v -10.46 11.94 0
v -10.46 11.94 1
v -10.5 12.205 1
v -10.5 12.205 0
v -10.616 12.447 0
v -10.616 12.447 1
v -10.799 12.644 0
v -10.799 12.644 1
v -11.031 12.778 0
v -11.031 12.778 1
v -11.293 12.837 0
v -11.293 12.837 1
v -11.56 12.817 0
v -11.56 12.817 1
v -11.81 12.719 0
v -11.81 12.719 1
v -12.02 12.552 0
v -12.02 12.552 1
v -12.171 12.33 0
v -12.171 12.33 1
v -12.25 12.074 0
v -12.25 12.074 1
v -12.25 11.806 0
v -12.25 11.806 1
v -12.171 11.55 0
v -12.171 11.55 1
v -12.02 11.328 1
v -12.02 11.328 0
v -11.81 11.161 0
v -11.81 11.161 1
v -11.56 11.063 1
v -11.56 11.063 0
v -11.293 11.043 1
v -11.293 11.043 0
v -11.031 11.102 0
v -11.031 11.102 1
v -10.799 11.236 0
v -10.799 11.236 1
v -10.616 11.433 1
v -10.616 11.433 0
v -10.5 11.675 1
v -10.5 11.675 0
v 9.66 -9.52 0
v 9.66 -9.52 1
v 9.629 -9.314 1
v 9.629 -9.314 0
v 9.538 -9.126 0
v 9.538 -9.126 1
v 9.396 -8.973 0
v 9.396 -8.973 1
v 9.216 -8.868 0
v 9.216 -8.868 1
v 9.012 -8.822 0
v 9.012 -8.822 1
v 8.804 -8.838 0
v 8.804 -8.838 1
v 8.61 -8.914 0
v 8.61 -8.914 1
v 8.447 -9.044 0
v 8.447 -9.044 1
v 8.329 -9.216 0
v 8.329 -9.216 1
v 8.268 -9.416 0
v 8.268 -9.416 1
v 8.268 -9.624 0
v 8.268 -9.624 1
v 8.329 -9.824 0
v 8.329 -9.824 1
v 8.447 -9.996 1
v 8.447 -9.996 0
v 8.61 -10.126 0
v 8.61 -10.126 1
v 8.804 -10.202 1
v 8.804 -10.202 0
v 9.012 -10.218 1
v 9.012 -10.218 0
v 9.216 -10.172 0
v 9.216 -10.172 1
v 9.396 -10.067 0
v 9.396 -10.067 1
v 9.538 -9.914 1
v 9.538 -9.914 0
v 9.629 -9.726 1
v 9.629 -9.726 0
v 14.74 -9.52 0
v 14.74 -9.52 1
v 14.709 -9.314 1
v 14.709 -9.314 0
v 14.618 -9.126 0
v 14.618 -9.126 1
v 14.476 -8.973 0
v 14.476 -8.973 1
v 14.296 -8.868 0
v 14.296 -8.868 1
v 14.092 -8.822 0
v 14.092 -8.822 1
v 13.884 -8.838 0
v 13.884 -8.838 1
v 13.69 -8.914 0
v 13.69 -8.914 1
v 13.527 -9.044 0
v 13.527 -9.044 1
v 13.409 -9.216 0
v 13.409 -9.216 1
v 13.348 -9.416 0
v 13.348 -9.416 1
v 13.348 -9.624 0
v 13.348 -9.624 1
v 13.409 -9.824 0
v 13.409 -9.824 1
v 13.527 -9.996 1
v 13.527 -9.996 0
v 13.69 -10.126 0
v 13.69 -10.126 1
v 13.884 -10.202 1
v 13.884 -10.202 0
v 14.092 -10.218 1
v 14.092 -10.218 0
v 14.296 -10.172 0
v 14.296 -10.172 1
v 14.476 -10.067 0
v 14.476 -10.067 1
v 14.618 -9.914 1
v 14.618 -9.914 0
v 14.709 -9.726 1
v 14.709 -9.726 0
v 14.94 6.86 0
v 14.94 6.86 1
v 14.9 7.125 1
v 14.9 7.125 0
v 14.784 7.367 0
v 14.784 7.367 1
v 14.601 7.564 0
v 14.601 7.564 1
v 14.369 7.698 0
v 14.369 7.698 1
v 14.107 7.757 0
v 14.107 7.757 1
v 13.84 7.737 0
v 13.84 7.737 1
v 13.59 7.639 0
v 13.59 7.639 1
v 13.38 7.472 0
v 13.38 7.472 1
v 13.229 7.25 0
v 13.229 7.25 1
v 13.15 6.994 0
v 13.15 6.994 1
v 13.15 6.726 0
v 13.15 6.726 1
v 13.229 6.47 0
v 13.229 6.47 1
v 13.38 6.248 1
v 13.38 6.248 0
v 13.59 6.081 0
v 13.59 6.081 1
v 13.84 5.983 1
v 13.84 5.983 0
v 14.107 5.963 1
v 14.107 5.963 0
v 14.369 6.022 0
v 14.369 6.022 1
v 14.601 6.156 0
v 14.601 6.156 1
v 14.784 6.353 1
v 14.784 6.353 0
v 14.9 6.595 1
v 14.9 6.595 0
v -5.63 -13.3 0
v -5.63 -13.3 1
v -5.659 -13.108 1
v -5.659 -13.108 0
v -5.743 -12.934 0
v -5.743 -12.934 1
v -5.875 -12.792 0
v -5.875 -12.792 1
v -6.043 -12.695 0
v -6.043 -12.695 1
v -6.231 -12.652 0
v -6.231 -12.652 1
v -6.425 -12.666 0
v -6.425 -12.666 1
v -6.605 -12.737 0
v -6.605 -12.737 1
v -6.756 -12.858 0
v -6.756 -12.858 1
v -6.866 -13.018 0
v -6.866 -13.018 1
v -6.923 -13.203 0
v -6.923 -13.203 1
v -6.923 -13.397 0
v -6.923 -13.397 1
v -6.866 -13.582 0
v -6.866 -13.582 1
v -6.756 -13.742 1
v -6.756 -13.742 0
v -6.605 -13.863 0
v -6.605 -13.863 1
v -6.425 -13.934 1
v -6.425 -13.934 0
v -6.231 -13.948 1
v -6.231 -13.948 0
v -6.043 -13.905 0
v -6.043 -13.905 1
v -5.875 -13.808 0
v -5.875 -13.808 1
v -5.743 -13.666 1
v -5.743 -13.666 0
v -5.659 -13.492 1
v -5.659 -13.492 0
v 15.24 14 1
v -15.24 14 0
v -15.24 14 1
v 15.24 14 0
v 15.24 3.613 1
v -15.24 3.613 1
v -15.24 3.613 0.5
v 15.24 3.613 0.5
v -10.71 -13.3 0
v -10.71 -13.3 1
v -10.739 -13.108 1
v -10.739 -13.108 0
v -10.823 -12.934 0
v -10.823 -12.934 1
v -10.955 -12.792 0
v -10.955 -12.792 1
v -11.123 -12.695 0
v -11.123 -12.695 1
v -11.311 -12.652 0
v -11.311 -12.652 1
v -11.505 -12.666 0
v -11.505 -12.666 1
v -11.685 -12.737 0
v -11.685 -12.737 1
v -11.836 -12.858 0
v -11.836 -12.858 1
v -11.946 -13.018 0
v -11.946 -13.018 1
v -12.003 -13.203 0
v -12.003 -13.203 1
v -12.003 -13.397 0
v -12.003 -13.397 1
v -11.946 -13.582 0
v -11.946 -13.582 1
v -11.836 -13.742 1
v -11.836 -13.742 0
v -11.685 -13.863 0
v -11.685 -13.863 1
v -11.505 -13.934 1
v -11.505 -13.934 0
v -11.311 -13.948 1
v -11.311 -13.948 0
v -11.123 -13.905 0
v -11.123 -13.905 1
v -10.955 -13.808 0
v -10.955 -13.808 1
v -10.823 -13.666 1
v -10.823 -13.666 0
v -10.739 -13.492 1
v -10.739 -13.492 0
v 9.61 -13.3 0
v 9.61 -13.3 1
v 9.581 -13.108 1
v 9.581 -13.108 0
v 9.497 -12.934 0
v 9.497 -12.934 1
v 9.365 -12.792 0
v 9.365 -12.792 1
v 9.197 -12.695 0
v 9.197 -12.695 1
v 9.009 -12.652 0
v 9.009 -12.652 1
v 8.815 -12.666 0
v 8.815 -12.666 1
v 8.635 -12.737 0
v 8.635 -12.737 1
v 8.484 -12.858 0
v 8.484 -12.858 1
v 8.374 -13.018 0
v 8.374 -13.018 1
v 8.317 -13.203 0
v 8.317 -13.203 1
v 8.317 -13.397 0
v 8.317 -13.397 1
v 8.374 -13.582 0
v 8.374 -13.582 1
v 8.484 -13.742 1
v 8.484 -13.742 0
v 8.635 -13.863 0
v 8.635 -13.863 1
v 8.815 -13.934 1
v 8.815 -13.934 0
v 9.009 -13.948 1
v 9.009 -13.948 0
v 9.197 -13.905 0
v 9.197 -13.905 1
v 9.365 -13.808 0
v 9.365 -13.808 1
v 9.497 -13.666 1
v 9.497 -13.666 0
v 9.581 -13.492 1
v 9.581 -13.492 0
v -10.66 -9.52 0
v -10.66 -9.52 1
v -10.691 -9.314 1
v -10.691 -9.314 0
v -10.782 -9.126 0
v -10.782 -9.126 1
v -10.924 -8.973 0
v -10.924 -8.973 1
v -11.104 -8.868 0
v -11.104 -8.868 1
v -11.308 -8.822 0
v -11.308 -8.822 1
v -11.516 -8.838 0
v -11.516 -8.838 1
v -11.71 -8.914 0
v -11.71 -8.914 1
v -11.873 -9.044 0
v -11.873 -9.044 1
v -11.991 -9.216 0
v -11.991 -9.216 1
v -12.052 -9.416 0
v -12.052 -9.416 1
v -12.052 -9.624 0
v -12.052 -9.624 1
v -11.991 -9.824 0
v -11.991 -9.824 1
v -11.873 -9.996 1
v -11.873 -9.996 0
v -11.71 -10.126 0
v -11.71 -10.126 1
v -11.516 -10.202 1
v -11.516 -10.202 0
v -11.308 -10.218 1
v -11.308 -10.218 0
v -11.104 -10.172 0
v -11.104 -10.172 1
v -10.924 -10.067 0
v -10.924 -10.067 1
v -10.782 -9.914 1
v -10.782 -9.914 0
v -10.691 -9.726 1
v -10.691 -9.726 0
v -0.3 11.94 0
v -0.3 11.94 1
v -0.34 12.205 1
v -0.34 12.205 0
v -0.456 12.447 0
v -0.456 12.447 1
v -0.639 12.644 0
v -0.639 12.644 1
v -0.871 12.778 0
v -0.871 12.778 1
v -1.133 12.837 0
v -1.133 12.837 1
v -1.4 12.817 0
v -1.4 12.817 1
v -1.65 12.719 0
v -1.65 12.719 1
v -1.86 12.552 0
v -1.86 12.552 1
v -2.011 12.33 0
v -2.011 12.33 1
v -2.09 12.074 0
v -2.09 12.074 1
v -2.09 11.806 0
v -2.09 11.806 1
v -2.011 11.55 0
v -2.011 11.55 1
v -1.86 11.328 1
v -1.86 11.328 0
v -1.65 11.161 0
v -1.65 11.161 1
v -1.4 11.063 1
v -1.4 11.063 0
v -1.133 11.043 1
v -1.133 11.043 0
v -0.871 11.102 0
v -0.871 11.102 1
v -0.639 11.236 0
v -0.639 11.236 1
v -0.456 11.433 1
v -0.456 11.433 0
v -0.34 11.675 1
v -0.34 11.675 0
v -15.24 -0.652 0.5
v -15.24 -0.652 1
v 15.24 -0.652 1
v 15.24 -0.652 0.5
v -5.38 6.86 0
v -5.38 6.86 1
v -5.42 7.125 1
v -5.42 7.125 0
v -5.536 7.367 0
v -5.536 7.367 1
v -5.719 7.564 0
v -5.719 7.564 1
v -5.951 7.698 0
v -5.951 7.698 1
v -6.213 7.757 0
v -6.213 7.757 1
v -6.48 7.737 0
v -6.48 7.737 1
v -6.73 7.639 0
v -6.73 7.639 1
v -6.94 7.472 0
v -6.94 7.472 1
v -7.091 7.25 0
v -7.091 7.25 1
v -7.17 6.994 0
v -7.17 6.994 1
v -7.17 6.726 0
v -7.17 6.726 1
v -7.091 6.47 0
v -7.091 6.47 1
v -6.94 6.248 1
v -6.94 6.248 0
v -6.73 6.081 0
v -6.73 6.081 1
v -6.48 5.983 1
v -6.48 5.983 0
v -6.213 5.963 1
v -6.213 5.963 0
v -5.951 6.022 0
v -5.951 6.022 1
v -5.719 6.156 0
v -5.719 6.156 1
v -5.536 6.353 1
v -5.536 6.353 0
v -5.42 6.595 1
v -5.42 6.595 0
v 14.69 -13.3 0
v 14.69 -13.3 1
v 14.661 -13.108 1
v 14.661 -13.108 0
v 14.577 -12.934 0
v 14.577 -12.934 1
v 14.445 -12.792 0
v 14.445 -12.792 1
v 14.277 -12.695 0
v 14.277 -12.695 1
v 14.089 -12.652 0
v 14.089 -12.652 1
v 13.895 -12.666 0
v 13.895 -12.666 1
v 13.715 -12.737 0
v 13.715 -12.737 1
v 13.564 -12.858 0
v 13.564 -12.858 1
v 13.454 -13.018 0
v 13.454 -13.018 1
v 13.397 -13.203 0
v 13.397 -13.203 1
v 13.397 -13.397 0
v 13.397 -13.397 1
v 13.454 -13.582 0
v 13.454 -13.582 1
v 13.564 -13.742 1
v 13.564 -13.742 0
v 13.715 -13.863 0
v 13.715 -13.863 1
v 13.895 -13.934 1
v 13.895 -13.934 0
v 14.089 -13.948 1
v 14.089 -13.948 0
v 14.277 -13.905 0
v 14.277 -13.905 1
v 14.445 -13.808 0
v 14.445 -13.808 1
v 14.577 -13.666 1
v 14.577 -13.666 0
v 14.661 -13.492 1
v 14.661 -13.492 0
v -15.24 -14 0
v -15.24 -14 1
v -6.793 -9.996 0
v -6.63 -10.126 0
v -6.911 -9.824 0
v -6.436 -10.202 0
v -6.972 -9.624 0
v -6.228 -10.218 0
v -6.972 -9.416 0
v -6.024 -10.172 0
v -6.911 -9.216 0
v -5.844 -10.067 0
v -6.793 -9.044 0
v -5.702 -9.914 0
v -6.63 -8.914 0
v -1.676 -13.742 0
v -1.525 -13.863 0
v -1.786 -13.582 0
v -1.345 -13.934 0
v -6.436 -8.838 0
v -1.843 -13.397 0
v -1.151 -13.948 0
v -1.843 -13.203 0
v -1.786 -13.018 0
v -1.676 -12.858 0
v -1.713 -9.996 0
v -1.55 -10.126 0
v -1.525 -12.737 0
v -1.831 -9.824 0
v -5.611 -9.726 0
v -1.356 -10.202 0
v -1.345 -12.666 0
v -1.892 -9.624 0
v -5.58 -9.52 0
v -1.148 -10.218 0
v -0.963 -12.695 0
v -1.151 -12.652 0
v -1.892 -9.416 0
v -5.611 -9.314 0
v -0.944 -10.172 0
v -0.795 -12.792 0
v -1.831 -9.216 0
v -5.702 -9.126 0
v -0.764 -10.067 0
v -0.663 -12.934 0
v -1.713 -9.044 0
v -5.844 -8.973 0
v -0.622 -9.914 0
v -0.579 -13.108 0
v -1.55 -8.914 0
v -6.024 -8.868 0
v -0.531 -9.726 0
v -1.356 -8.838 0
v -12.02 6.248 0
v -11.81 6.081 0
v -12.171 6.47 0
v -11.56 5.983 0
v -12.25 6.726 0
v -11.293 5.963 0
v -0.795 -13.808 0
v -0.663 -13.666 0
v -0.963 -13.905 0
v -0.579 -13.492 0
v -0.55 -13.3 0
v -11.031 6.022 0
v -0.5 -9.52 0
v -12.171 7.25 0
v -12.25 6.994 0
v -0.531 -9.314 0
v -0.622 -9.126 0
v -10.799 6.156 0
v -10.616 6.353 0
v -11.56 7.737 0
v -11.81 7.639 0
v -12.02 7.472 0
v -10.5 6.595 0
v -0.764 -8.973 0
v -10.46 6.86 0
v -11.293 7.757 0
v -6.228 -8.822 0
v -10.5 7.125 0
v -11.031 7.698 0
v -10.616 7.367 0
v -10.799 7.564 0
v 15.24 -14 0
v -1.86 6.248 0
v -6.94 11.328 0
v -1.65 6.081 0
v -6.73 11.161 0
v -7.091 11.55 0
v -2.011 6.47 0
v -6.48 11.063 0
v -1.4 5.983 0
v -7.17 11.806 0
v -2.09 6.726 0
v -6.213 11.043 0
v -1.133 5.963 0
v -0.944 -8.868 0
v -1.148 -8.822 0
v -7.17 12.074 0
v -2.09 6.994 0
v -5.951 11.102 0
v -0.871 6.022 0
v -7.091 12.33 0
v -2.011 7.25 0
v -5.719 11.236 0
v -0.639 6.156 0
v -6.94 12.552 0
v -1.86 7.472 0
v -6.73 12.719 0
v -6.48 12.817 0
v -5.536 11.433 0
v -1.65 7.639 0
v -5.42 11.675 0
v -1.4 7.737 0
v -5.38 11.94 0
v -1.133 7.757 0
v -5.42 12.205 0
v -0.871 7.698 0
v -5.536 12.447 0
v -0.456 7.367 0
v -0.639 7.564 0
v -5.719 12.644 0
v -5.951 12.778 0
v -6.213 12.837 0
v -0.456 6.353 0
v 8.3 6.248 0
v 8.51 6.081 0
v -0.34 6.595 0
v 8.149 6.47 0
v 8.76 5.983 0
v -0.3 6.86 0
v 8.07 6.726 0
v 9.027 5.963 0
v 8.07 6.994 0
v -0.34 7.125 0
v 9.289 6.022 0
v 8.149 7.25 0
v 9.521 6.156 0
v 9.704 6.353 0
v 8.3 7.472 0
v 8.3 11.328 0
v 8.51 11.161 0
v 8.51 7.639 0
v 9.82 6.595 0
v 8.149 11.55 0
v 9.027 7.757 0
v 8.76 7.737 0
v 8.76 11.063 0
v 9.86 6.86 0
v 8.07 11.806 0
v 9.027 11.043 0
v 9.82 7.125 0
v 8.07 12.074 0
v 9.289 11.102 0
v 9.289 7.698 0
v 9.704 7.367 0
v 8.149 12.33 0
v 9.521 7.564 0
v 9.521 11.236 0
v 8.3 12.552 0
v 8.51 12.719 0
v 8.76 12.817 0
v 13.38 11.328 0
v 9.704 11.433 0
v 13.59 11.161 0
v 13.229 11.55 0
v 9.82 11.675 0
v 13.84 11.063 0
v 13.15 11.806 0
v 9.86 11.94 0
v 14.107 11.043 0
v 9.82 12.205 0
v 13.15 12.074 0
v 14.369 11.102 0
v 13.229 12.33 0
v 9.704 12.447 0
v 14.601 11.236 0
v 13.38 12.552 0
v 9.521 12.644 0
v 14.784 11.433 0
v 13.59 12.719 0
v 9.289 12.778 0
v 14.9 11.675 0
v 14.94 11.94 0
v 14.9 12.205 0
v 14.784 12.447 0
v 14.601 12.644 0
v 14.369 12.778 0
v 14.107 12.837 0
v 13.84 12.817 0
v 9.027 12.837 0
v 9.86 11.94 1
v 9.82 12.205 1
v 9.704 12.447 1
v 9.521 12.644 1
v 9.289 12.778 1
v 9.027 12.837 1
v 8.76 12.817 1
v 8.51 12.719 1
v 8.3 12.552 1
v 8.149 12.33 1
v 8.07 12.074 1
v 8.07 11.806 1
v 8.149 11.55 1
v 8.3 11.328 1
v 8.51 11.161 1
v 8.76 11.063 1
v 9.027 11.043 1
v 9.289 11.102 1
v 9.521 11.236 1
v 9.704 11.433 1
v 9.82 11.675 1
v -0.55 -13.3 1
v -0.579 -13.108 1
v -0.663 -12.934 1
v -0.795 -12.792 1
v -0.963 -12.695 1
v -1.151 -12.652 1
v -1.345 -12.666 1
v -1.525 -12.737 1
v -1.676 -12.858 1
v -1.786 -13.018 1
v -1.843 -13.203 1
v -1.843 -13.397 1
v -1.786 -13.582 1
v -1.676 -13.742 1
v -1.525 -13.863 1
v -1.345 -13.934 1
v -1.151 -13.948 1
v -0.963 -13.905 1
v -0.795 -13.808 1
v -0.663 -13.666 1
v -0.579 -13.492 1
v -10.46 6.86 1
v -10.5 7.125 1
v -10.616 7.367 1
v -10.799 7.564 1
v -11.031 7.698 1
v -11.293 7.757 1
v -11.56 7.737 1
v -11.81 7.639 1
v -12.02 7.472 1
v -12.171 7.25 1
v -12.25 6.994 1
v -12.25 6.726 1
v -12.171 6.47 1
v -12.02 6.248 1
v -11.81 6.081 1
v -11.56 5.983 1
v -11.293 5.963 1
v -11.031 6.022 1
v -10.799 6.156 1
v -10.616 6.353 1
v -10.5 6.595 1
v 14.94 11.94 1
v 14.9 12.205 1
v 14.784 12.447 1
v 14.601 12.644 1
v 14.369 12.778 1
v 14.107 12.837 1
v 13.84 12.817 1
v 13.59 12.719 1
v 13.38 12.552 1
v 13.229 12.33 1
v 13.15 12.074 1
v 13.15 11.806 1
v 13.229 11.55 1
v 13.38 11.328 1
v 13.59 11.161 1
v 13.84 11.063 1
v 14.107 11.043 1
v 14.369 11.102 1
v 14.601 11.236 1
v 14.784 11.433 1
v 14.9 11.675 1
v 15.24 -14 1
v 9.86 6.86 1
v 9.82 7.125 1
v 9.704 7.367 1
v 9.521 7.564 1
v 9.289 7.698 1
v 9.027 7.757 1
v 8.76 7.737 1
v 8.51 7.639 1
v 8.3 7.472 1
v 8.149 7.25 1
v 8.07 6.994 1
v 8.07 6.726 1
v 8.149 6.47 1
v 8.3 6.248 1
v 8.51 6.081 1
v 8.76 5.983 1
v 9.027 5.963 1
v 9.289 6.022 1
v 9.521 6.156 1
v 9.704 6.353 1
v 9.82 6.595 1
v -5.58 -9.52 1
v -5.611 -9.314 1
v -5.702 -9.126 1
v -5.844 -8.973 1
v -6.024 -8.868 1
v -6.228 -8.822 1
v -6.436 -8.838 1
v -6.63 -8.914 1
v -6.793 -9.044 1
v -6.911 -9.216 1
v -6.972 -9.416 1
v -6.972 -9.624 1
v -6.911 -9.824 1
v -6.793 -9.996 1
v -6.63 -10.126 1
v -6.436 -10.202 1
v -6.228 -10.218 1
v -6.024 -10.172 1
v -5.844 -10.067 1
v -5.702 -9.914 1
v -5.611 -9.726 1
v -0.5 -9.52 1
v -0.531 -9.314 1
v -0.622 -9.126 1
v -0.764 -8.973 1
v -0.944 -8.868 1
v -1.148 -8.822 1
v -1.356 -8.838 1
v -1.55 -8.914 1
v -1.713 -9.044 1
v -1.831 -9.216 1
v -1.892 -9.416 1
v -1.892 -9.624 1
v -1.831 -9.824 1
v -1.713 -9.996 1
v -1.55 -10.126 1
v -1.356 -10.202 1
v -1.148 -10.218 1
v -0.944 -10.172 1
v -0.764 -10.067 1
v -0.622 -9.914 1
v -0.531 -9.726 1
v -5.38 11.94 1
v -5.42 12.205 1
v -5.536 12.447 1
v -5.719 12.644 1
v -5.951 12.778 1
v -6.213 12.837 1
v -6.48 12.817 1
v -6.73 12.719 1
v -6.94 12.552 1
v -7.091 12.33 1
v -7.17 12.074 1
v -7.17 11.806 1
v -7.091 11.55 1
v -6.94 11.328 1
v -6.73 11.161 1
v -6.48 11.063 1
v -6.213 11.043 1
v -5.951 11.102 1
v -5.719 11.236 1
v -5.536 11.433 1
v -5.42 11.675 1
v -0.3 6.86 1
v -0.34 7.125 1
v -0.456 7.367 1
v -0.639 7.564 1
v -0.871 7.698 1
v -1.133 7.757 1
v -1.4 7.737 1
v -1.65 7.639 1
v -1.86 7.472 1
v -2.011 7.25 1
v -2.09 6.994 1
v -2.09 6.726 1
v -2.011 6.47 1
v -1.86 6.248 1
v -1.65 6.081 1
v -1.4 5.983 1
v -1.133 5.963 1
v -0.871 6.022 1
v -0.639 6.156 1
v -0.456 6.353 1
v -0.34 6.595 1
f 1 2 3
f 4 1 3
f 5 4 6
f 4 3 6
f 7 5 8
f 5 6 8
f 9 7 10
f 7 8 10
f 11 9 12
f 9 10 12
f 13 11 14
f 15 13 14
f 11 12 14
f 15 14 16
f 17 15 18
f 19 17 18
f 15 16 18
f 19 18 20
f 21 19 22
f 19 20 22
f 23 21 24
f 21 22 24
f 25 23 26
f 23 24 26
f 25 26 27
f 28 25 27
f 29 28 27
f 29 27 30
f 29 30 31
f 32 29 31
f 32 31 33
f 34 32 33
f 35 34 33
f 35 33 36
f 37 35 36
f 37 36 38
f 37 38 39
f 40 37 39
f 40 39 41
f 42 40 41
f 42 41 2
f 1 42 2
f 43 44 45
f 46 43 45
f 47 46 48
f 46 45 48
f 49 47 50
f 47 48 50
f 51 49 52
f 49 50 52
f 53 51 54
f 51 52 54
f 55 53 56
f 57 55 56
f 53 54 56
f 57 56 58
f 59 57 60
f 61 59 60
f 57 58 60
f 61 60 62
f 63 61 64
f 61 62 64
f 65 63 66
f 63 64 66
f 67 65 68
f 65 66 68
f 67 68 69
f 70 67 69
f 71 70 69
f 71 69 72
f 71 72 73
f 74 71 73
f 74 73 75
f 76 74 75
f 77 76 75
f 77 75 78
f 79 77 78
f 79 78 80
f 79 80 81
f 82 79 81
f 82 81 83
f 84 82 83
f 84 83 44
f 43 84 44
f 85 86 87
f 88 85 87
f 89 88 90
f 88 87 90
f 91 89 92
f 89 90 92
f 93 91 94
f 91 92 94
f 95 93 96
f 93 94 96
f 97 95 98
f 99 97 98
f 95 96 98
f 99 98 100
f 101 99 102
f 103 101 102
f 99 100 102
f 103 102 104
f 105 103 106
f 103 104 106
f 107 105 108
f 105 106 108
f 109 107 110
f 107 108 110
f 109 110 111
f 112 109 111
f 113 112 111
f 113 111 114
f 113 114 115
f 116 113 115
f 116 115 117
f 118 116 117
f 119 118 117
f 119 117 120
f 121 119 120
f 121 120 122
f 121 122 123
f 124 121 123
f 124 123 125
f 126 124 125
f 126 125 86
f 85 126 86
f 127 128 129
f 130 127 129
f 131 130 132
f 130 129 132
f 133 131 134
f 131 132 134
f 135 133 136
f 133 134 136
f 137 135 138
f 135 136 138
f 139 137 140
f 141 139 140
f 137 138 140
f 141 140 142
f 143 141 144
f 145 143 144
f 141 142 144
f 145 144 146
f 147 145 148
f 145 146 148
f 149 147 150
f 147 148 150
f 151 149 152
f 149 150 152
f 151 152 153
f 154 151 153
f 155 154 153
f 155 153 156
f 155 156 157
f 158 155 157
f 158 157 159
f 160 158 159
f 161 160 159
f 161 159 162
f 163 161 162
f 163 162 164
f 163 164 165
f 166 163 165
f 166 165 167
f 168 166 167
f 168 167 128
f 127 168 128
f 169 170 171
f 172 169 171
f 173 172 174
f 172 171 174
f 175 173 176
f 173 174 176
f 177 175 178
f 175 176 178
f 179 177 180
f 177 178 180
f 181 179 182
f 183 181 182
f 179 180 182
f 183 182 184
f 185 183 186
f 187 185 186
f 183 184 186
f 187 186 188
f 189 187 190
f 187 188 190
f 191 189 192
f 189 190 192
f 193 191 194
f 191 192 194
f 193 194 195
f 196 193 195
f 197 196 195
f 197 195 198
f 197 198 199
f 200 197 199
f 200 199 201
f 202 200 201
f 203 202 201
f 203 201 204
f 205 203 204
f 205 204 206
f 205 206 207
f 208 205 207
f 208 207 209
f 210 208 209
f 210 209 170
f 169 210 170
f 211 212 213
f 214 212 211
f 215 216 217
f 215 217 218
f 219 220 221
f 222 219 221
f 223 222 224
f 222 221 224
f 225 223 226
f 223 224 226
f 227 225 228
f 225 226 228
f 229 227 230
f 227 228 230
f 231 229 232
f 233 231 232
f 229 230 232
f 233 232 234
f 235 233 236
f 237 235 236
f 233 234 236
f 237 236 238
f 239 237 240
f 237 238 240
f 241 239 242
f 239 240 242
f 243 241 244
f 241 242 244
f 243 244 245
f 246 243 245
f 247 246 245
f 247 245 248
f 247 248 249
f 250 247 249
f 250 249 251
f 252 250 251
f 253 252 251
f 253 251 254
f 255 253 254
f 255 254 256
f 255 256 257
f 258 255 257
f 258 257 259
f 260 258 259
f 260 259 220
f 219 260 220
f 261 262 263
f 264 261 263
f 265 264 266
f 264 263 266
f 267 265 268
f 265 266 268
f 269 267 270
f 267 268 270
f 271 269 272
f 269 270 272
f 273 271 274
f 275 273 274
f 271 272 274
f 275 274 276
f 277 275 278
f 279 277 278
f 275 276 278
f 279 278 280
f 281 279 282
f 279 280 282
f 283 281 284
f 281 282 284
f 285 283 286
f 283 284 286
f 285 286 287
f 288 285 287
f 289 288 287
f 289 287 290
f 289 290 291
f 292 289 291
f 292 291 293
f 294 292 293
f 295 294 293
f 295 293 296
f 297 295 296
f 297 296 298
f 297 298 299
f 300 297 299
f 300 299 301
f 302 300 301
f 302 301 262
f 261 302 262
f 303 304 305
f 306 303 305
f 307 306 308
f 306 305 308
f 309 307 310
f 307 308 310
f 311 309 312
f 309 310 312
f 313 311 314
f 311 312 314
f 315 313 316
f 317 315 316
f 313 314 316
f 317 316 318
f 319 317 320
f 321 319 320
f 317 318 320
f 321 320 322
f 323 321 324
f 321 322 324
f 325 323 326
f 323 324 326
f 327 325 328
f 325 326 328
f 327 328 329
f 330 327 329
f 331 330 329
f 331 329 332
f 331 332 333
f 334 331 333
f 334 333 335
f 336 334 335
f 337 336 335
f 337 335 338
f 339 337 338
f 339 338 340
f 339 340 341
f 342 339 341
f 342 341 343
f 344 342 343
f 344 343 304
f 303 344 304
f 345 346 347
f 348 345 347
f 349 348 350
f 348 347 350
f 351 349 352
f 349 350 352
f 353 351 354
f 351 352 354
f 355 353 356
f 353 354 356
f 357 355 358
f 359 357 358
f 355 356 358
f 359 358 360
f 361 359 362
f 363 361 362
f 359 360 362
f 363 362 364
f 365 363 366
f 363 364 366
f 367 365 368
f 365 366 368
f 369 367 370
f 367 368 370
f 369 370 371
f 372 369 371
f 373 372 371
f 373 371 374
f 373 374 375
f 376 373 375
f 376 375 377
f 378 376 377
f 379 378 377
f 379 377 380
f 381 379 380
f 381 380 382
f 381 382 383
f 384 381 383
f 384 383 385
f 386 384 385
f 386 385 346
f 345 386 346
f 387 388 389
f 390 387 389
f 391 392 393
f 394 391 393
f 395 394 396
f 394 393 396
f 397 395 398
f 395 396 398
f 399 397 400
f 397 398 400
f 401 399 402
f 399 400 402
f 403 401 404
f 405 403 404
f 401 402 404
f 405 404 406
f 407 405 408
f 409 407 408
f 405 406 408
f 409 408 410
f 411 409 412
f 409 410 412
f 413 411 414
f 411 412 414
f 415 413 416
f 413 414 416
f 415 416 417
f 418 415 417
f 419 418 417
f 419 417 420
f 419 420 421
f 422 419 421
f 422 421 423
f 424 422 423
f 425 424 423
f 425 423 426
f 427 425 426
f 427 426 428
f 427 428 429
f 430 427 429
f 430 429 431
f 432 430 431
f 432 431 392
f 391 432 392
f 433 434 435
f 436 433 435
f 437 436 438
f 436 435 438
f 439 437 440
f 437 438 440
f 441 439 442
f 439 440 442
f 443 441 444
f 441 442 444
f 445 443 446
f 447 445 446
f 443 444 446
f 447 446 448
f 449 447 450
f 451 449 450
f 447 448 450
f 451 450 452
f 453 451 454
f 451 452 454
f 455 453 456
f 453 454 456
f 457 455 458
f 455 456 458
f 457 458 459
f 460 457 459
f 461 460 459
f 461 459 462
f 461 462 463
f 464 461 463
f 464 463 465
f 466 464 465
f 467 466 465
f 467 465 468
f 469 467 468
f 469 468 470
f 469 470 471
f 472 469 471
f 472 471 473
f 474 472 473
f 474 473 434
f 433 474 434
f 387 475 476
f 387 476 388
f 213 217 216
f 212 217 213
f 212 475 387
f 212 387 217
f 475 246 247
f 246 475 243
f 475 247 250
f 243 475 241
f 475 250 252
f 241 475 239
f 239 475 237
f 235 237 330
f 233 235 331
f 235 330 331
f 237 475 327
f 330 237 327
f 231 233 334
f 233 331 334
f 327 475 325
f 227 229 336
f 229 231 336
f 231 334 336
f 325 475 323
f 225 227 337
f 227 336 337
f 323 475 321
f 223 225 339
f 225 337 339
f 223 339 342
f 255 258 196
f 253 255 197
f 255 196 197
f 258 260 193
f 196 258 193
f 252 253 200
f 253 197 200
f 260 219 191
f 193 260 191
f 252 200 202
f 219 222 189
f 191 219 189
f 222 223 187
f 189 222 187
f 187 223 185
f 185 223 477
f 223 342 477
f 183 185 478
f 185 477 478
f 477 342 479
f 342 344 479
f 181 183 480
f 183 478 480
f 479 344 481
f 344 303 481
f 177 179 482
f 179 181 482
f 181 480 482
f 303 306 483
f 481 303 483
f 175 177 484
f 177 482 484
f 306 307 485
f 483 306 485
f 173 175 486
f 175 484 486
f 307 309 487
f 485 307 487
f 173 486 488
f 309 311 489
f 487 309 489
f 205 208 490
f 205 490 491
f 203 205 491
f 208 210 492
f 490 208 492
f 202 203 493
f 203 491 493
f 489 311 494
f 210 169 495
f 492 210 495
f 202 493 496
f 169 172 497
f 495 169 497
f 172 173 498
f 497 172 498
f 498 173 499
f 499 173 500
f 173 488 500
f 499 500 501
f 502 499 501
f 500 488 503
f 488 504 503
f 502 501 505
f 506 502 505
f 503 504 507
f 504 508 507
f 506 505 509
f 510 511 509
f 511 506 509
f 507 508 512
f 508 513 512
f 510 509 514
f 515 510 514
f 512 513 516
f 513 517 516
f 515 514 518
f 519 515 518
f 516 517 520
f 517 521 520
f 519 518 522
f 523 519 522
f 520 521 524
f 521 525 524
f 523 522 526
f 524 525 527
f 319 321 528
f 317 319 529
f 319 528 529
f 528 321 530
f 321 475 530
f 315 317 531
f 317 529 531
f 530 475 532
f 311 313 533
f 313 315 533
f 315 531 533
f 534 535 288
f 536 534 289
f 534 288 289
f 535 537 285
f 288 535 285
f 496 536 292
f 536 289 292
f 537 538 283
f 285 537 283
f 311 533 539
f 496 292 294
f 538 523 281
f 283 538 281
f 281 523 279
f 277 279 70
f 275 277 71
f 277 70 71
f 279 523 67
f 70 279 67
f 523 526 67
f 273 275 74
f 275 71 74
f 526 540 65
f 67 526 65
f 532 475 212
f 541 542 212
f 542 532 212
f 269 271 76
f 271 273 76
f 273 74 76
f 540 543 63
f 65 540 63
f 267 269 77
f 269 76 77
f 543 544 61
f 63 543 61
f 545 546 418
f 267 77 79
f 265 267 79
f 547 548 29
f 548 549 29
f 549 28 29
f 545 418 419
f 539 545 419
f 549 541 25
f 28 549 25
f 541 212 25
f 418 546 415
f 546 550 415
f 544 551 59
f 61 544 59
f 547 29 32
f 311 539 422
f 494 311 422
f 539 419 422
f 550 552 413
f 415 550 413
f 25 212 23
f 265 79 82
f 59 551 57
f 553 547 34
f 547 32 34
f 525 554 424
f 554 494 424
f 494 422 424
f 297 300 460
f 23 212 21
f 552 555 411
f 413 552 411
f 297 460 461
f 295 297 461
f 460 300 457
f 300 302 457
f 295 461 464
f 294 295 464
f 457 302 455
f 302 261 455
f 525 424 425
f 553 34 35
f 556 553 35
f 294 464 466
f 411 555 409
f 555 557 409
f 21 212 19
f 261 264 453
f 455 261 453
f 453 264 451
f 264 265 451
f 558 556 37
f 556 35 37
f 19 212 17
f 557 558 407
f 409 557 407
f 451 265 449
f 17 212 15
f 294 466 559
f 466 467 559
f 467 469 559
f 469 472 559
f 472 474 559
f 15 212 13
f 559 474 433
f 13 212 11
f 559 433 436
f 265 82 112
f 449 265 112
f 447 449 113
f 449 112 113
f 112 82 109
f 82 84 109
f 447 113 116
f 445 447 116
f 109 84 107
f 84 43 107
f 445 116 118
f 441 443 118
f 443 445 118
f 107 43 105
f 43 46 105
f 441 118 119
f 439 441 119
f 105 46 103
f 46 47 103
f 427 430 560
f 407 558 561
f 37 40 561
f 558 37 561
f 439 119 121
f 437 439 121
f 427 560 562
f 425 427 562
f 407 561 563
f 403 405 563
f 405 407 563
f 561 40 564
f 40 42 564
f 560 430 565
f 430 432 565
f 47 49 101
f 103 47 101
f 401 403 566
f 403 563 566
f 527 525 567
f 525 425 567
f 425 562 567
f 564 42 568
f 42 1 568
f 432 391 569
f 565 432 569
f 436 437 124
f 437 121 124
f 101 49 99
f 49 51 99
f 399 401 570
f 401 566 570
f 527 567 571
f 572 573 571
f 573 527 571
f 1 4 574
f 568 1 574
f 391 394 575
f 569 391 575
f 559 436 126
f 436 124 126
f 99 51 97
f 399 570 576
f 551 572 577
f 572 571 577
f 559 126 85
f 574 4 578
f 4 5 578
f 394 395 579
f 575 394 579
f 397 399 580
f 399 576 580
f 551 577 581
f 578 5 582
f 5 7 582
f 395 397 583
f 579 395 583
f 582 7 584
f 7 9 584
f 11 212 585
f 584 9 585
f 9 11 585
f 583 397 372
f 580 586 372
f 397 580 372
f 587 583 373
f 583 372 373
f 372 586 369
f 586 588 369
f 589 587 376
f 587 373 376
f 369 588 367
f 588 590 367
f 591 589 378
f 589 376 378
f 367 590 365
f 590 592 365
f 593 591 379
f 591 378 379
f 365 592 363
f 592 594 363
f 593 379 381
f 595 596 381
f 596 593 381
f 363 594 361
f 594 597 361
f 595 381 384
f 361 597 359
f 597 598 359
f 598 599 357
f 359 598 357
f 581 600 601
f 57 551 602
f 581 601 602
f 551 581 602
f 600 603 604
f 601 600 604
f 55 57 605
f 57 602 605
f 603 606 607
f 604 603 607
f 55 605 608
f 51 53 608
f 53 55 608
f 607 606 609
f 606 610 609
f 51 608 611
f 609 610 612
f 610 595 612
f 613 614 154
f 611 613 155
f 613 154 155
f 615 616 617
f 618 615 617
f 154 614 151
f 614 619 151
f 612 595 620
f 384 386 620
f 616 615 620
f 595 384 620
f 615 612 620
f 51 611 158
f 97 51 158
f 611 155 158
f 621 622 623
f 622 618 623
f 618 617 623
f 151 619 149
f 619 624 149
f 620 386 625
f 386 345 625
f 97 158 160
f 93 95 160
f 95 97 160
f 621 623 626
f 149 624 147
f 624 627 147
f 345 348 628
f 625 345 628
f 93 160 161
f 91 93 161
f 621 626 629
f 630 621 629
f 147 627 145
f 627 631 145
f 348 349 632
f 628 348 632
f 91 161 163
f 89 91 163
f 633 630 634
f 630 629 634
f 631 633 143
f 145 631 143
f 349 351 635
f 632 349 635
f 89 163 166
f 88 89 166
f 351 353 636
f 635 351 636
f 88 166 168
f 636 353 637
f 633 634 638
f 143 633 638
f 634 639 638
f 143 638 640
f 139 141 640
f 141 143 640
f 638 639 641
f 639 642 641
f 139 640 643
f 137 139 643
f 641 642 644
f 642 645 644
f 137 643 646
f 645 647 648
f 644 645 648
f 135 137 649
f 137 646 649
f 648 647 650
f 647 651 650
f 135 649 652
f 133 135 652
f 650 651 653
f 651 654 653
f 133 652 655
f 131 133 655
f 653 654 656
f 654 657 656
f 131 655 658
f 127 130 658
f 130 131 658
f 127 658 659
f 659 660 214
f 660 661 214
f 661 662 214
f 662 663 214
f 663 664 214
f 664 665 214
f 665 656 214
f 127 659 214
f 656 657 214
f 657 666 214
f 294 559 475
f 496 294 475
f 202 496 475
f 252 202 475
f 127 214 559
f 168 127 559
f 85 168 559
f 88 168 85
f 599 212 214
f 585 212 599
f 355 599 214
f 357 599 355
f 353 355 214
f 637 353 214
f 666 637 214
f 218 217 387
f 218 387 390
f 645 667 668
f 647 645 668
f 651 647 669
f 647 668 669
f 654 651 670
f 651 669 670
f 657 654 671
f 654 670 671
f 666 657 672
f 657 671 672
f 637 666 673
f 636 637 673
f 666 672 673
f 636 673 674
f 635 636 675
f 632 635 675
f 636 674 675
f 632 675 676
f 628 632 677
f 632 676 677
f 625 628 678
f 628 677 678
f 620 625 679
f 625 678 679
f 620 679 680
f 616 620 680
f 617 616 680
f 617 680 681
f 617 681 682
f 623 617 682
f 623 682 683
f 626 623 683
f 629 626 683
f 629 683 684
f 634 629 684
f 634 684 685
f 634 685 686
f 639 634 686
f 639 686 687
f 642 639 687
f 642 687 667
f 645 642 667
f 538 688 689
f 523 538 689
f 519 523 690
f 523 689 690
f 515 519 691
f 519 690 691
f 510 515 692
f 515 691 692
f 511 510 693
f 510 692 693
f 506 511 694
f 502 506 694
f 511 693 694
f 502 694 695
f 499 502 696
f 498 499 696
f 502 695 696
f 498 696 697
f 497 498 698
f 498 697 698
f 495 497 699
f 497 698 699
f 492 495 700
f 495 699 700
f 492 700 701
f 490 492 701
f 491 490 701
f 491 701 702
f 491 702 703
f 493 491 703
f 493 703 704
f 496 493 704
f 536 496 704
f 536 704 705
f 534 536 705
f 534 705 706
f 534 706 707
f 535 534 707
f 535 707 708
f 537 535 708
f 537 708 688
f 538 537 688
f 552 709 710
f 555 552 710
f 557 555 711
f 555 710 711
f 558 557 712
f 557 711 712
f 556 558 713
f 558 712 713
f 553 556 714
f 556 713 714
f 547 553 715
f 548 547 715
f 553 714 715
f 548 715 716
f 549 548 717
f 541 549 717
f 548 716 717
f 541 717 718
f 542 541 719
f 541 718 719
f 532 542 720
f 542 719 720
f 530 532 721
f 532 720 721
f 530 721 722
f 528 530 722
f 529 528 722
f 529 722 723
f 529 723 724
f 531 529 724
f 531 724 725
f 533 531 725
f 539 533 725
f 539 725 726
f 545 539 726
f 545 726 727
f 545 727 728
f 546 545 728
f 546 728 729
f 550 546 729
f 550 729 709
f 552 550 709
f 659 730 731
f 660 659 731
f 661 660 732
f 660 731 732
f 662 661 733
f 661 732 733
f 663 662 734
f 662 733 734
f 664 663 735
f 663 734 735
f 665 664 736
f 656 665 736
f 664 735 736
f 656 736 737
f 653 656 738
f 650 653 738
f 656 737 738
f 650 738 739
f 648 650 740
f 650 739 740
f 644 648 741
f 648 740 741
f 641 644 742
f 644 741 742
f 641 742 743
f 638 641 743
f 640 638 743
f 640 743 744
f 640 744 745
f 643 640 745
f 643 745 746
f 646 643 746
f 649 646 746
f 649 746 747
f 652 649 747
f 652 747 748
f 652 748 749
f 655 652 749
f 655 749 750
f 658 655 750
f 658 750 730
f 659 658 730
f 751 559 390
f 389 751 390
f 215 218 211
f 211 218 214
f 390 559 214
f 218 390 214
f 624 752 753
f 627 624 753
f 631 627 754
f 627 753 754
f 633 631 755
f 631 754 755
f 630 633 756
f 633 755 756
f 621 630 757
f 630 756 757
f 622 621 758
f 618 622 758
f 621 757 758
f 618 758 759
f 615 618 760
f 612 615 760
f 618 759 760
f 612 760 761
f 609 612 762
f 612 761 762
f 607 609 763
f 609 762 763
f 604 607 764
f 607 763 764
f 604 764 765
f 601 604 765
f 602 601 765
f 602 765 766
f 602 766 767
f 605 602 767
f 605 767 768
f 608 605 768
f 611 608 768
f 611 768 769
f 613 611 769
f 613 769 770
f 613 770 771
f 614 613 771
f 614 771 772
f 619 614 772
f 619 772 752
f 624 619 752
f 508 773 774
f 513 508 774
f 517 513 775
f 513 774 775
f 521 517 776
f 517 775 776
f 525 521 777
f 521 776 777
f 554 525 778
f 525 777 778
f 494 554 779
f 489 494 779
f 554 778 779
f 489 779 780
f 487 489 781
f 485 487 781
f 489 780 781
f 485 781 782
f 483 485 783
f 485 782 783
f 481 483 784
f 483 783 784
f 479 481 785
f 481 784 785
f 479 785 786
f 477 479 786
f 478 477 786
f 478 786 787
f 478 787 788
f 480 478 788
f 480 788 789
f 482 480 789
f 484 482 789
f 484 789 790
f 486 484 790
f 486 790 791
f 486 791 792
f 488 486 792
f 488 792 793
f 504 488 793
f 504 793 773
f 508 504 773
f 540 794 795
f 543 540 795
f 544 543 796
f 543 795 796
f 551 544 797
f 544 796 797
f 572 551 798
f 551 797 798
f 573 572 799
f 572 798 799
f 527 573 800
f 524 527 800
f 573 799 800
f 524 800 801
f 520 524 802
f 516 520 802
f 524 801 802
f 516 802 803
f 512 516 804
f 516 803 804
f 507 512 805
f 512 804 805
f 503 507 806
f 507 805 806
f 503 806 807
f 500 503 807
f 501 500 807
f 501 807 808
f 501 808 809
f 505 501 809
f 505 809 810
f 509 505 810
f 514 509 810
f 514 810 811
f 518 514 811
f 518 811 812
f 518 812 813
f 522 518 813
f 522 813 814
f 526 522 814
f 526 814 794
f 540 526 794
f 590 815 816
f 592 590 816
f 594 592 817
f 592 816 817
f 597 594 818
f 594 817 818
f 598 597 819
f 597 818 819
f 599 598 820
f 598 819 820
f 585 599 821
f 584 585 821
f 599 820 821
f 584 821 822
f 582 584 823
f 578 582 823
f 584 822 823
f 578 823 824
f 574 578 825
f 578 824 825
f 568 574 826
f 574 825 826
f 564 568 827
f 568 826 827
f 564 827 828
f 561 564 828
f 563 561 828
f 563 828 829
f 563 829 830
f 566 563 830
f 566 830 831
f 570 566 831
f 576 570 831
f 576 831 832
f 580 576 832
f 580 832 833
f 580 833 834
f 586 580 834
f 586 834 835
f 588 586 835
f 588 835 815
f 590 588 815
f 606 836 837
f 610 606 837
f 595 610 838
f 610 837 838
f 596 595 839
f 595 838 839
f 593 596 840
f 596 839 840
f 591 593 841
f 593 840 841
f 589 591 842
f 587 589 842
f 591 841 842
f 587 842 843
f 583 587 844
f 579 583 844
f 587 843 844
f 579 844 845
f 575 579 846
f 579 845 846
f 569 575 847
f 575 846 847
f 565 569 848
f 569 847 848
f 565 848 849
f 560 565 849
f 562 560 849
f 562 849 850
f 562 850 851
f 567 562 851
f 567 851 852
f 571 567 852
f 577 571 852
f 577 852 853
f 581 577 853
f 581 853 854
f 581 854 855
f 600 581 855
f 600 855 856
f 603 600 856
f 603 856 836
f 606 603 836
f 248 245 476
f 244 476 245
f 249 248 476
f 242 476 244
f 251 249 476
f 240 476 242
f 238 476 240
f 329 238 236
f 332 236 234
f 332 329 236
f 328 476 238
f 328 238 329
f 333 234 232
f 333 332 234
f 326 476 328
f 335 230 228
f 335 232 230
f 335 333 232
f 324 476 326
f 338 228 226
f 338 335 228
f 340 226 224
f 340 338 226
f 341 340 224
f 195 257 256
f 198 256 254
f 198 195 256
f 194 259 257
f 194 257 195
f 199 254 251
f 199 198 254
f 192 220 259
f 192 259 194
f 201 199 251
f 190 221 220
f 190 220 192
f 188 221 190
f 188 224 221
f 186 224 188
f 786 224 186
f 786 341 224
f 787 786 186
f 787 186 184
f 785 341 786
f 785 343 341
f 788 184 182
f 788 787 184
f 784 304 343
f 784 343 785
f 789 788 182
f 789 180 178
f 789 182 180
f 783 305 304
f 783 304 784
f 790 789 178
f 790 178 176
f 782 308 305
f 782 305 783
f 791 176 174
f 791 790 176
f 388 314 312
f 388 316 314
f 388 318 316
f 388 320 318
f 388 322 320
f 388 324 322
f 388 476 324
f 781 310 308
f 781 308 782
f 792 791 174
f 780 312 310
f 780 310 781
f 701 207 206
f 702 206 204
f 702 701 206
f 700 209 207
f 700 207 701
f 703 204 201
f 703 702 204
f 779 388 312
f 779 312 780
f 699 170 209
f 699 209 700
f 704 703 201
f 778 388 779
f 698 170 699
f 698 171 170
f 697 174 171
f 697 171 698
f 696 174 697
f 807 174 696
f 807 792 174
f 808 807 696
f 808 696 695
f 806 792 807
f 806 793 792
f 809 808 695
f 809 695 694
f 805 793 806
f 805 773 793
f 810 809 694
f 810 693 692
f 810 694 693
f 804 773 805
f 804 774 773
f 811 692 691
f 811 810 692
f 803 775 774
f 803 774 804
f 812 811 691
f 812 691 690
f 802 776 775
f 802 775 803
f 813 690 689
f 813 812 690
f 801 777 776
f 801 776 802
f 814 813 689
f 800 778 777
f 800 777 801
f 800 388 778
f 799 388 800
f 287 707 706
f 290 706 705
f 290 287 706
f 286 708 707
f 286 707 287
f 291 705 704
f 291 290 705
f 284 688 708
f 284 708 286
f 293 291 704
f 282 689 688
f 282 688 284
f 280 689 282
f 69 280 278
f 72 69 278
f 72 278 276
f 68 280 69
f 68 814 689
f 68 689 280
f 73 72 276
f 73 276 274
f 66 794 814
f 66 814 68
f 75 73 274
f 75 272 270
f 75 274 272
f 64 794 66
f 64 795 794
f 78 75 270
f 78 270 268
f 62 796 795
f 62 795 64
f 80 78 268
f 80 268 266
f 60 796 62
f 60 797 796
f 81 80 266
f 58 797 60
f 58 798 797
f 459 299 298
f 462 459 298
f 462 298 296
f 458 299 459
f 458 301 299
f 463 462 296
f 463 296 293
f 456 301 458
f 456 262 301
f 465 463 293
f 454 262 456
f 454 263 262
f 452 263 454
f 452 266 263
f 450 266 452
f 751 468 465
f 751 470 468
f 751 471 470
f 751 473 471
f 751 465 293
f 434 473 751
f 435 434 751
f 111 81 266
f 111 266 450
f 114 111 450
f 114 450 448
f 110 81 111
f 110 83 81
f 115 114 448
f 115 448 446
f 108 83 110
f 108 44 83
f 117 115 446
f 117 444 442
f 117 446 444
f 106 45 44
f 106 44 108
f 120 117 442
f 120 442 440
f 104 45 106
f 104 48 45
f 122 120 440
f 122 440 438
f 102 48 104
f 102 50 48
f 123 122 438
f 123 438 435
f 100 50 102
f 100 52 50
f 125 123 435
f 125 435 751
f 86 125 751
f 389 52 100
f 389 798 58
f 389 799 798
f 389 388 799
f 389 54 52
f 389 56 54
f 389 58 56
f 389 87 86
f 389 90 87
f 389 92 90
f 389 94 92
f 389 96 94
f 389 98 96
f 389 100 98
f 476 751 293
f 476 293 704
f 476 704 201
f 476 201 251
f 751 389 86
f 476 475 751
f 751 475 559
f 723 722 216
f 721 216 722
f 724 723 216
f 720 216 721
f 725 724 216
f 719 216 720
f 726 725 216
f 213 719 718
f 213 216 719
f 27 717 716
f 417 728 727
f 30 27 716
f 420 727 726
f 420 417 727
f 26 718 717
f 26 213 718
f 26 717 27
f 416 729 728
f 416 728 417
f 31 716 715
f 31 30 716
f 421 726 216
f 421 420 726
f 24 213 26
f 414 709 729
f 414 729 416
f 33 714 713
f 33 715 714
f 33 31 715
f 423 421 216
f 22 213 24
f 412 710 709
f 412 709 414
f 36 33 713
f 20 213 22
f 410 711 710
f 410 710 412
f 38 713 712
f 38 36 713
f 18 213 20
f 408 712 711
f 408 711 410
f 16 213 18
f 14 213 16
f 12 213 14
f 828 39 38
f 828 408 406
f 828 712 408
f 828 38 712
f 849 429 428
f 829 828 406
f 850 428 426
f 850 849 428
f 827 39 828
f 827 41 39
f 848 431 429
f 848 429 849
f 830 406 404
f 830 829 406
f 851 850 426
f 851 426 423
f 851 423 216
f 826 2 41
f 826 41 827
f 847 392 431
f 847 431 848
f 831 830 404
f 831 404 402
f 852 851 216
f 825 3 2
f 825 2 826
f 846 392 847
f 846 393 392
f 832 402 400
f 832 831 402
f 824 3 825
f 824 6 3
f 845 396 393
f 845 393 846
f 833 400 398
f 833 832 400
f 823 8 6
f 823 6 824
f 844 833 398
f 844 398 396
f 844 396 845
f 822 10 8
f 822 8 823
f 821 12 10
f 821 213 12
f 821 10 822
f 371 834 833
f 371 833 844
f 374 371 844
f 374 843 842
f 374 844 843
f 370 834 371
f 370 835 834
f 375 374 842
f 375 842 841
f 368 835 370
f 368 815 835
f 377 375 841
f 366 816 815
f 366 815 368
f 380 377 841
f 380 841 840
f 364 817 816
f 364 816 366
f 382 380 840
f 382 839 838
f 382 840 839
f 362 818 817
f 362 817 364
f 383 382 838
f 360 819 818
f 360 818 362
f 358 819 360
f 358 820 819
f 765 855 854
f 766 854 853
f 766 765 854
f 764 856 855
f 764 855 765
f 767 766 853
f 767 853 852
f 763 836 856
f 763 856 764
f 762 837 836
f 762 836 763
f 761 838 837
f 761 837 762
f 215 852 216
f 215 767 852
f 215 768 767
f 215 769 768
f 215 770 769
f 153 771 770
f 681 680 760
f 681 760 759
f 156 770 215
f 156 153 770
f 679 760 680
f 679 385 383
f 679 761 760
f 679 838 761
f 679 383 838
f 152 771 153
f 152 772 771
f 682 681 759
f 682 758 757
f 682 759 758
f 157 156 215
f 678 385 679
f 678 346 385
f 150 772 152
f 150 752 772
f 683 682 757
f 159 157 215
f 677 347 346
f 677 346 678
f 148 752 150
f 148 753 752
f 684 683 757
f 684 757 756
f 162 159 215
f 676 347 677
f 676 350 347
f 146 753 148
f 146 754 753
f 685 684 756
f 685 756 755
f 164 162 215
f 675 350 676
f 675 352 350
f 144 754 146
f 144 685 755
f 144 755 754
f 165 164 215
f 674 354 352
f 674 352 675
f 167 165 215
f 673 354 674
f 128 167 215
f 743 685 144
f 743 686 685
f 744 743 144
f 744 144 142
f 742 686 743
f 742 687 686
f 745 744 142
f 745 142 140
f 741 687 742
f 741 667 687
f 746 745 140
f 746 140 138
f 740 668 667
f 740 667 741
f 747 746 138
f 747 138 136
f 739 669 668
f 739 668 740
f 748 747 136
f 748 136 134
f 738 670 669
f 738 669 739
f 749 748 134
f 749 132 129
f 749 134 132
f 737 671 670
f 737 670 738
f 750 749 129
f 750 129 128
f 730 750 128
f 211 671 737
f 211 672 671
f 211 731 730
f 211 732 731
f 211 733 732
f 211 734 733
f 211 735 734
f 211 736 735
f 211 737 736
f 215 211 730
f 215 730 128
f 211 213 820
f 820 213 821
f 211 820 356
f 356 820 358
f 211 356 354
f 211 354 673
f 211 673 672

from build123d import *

# Parameters (mm, degrees)
F0_W     = 30.48
F0_H     = 28
F1_DEPTH = 1
F3_W     = 30.48
F3_H     = 4.265539
F4_DEPTH = 0.5
F2_R     = 0.9
F2_R_2   = 0.7
F2_R_3   = 0.65
F5_DEPTH = 2


with BuildPart() as f1:
    # F0 (on Top) → F1 (new body)
    with BuildSketch(Plane.XY):
        Rectangle(F0_W, F0_H)
    extrude(amount=F1_DEPTH)

    # F3 (on face) → F4 (cut)
    with BuildSketch(Plane.XY.offset(1)):
        with Locations((0, 1.480549)):
            Rectangle(F3_W, F3_H)
    extrude(amount=-F4_DEPTH, mode=Mode.SUBTRACT)

    # F2 (on face) → F5 (cut)
    with BuildSketch(Plane.XY.offset(1)):
        with Locations((-11.36, 11.94)):
            Circle(F2_R)
        with Locations((-6.28, 11.94)):
            Circle(F2_R)
        with Locations((-1.2, 11.94)):
            Circle(F2_R)
        with Locations((8.96, 11.94)):
            Circle(F2_R)
        with Locations((14.04, 11.94)):
            Circle(F2_R)
        with Locations((-11.36, 6.86)):
            Circle(F2_R)
        with Locations((-6.28, 6.86)):
            Circle(F2_R)
        with Locations((-1.2, 6.86)):
            Circle(F2_R)
        with Locations((8.96, 6.86)):
            Circle(F2_R)
        with Locations((14.04, 6.86)):
            Circle(F2_R)
        with Locations((-11.36, -9.52)):
            Circle(F2_R_2)
        with Locations((-6.28, -9.52)):
            Circle(F2_R_2)
        with Locations((-1.2, -9.52)):
            Circle(F2_R_2)
        with Locations((8.96, -9.52)):
            Circle(F2_R_2)
        with Locations((14.04, -9.52)):
            Circle(F2_R_2)
        with Locations((-11.36, -13.3)):
            Circle(F2_R_3)
        with Locations((-6.28, -13.3)):
            Circle(F2_R_3)
        with Locations((-1.2, -13.3)):
            Circle(F2_R_3)
        with Locations((8.96, -13.3)):
            Circle(F2_R_3)
        with Locations((14.04, -13.3)):
            Circle(F2_R_3)
    extrude(amount=-F5_DEPTH, mode=Mode.SUBTRACT)


solid = f1.part
